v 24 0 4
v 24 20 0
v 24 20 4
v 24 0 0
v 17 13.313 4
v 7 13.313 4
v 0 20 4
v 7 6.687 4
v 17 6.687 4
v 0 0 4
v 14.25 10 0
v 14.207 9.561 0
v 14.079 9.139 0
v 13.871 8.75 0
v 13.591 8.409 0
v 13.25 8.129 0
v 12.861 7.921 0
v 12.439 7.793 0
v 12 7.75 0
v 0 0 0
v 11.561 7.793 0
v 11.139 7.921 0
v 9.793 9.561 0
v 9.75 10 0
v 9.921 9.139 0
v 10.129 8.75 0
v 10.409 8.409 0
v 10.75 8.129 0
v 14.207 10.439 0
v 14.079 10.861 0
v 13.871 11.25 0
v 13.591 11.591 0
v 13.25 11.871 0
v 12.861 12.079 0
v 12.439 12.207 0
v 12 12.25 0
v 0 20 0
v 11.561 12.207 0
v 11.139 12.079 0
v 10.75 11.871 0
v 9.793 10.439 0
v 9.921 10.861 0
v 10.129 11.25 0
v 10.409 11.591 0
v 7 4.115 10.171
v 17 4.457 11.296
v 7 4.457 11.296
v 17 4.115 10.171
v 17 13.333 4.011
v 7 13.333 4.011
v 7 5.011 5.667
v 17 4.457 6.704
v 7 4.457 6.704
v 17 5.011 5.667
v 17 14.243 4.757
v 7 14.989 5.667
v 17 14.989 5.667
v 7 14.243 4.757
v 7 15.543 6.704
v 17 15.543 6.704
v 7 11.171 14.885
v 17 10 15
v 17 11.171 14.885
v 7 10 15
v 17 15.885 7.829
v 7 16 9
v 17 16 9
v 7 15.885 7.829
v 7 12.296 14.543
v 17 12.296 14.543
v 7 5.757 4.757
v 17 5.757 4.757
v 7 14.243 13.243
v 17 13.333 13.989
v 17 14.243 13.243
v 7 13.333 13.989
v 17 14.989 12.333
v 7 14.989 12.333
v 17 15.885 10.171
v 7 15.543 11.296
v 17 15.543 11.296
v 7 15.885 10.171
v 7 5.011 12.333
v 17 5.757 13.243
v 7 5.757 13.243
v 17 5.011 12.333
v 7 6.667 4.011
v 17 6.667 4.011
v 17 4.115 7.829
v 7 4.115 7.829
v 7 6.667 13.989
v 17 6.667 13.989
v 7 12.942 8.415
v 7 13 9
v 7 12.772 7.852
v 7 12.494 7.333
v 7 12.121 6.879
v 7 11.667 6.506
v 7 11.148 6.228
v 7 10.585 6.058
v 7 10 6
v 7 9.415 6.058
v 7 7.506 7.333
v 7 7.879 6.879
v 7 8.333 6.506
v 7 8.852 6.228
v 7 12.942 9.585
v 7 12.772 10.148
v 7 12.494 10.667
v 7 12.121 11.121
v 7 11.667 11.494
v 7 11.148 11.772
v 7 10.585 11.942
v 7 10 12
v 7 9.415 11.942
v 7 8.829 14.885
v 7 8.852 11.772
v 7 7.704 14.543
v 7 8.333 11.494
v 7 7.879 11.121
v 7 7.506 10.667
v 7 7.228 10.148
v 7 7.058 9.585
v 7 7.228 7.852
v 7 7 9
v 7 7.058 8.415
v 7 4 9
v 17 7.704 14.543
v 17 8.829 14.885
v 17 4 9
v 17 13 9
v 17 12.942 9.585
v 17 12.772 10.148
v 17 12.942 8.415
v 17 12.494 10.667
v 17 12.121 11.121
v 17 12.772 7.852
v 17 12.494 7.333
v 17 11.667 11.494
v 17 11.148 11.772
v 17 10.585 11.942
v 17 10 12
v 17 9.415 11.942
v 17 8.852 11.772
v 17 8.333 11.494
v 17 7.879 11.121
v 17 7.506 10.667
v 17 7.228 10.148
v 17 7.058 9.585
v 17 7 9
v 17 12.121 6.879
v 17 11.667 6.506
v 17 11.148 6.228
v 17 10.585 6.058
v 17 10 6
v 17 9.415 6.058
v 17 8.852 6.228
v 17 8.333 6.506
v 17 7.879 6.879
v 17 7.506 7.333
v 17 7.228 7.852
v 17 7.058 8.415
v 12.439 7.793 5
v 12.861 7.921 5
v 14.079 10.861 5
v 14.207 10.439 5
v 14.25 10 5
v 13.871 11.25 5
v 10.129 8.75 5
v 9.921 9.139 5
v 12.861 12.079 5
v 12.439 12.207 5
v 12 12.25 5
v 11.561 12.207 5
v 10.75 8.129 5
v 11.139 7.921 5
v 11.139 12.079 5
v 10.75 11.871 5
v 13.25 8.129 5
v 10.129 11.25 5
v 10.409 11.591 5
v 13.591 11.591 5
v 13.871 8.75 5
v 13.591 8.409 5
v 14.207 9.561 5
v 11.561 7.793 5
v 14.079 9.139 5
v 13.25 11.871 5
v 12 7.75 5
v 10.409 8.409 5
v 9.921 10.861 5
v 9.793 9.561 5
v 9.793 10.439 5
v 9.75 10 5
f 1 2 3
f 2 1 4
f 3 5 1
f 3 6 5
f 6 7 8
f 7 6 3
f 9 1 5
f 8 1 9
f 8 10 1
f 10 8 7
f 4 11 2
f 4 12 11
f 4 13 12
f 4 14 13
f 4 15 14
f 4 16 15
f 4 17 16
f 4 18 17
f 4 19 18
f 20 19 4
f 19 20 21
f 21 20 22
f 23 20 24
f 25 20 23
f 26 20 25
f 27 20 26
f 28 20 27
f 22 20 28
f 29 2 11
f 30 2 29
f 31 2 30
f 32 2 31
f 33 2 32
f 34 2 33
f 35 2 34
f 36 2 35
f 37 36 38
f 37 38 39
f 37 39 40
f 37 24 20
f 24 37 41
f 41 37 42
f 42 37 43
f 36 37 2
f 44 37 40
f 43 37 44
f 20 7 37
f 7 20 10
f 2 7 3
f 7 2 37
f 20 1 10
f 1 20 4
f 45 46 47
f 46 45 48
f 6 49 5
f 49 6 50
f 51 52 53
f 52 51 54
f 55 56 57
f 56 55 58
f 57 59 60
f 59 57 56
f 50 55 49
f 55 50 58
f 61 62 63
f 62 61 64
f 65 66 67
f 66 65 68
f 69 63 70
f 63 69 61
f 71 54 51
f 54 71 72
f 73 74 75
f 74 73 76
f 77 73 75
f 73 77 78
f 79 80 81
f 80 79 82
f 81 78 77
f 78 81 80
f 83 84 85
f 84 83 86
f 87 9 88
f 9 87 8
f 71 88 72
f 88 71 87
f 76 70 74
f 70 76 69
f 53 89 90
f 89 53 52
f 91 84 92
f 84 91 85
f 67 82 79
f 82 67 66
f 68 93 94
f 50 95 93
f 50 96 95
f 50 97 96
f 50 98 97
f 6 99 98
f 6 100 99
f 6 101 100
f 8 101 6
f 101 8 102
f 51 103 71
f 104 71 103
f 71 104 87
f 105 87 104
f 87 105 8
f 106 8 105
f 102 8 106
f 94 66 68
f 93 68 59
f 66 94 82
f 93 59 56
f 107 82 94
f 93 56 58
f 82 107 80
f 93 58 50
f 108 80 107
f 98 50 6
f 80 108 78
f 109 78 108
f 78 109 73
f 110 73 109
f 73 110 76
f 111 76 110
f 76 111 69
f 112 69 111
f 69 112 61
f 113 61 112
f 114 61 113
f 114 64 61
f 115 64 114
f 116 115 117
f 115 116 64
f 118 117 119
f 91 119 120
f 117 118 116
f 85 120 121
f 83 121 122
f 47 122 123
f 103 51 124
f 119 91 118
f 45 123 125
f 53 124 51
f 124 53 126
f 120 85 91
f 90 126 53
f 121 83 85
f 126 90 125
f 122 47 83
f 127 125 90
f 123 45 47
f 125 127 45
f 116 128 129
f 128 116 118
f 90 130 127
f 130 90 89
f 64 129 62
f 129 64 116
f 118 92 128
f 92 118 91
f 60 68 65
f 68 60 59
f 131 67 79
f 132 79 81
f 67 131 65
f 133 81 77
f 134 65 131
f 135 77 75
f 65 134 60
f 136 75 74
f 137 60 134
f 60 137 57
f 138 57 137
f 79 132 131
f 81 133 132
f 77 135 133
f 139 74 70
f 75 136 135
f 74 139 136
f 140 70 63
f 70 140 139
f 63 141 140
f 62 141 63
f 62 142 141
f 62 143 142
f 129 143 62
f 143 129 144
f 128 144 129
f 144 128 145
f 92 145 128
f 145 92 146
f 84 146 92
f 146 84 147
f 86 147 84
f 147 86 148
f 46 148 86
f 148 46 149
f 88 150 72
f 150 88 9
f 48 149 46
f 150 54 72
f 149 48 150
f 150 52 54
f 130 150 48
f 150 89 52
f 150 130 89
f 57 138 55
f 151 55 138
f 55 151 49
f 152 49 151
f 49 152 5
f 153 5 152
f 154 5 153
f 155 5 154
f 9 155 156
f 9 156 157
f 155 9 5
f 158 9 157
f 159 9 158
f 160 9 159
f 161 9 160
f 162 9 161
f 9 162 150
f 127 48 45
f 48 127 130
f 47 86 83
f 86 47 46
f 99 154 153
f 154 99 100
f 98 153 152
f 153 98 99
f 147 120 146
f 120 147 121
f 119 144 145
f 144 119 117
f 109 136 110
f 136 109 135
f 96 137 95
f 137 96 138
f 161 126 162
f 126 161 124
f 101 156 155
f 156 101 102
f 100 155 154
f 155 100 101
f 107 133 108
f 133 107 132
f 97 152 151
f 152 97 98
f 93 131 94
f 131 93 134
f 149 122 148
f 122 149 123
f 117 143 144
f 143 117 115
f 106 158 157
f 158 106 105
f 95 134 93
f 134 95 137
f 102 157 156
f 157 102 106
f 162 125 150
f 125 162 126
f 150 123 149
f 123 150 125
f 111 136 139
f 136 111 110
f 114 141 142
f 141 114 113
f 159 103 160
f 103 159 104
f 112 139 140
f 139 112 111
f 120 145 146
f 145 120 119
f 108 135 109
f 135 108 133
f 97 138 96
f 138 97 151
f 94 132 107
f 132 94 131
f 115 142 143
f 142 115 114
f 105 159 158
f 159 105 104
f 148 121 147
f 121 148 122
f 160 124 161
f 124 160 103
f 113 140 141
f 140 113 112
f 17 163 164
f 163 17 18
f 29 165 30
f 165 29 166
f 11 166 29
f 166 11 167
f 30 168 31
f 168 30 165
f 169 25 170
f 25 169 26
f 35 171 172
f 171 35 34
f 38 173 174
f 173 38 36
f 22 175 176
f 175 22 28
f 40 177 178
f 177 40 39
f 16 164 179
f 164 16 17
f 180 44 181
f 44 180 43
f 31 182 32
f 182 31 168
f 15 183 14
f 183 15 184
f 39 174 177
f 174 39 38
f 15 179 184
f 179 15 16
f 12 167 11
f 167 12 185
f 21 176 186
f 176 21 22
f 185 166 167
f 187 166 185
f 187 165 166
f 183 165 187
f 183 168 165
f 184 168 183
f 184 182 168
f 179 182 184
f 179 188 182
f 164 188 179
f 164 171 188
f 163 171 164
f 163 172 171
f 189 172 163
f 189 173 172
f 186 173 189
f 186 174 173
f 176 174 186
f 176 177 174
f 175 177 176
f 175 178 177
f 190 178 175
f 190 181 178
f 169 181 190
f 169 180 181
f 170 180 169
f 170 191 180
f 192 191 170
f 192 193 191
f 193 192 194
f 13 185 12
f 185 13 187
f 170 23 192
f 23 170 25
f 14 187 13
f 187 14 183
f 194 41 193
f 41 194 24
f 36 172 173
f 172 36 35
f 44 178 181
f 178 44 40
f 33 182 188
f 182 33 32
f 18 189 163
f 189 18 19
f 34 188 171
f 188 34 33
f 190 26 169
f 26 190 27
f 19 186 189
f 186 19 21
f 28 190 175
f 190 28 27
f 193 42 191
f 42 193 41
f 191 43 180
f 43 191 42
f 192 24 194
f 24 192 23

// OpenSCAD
$fn = 32;

// ----------------------------------------------------------------------
// Cable clip: cable 6 mm, clamp 12 mm, base 24 mm
// ----------------------------------------------------------------------

// --- parameters (mm) ---
base_w = 24;              // base length, X
base_d = 20;              // base width, Y
base_t = 4;               // base thickness
clamp_d = 12;             // clamp outside diameter
wall_t = 3;               // clamp wall
cable_d = 6;              // cable opening
ring_w = 10;              // clamp width along the cable
screw_d = 4.5;            // screw clearance
sink = 1;                 // overlap of the clamp into the base

module base() {
  cube([base_w, base_d, base_t]);
}

module clamp() {
  translate([base_w / 2, base_d / 2, base_t + clamp_d / 2 - sink]) rotate([0, 90, 0])
    cylinder(h = ring_w, d = clamp_d, center = true);
}

difference() {
  union() {
    base();
    clamp();
  }
  translate([base_w / 2, base_d / 2, base_t + clamp_d / 2 - sink]) rotate([0, 90, 0]) translate([0, 0, -ring_w / 2 - 1]) cylinder(h = ring_w + 2, d = cable_d);
  translate([12, base_d / 2, -1]) cylinder(h = base_t + 2, d = screw_d);
}
